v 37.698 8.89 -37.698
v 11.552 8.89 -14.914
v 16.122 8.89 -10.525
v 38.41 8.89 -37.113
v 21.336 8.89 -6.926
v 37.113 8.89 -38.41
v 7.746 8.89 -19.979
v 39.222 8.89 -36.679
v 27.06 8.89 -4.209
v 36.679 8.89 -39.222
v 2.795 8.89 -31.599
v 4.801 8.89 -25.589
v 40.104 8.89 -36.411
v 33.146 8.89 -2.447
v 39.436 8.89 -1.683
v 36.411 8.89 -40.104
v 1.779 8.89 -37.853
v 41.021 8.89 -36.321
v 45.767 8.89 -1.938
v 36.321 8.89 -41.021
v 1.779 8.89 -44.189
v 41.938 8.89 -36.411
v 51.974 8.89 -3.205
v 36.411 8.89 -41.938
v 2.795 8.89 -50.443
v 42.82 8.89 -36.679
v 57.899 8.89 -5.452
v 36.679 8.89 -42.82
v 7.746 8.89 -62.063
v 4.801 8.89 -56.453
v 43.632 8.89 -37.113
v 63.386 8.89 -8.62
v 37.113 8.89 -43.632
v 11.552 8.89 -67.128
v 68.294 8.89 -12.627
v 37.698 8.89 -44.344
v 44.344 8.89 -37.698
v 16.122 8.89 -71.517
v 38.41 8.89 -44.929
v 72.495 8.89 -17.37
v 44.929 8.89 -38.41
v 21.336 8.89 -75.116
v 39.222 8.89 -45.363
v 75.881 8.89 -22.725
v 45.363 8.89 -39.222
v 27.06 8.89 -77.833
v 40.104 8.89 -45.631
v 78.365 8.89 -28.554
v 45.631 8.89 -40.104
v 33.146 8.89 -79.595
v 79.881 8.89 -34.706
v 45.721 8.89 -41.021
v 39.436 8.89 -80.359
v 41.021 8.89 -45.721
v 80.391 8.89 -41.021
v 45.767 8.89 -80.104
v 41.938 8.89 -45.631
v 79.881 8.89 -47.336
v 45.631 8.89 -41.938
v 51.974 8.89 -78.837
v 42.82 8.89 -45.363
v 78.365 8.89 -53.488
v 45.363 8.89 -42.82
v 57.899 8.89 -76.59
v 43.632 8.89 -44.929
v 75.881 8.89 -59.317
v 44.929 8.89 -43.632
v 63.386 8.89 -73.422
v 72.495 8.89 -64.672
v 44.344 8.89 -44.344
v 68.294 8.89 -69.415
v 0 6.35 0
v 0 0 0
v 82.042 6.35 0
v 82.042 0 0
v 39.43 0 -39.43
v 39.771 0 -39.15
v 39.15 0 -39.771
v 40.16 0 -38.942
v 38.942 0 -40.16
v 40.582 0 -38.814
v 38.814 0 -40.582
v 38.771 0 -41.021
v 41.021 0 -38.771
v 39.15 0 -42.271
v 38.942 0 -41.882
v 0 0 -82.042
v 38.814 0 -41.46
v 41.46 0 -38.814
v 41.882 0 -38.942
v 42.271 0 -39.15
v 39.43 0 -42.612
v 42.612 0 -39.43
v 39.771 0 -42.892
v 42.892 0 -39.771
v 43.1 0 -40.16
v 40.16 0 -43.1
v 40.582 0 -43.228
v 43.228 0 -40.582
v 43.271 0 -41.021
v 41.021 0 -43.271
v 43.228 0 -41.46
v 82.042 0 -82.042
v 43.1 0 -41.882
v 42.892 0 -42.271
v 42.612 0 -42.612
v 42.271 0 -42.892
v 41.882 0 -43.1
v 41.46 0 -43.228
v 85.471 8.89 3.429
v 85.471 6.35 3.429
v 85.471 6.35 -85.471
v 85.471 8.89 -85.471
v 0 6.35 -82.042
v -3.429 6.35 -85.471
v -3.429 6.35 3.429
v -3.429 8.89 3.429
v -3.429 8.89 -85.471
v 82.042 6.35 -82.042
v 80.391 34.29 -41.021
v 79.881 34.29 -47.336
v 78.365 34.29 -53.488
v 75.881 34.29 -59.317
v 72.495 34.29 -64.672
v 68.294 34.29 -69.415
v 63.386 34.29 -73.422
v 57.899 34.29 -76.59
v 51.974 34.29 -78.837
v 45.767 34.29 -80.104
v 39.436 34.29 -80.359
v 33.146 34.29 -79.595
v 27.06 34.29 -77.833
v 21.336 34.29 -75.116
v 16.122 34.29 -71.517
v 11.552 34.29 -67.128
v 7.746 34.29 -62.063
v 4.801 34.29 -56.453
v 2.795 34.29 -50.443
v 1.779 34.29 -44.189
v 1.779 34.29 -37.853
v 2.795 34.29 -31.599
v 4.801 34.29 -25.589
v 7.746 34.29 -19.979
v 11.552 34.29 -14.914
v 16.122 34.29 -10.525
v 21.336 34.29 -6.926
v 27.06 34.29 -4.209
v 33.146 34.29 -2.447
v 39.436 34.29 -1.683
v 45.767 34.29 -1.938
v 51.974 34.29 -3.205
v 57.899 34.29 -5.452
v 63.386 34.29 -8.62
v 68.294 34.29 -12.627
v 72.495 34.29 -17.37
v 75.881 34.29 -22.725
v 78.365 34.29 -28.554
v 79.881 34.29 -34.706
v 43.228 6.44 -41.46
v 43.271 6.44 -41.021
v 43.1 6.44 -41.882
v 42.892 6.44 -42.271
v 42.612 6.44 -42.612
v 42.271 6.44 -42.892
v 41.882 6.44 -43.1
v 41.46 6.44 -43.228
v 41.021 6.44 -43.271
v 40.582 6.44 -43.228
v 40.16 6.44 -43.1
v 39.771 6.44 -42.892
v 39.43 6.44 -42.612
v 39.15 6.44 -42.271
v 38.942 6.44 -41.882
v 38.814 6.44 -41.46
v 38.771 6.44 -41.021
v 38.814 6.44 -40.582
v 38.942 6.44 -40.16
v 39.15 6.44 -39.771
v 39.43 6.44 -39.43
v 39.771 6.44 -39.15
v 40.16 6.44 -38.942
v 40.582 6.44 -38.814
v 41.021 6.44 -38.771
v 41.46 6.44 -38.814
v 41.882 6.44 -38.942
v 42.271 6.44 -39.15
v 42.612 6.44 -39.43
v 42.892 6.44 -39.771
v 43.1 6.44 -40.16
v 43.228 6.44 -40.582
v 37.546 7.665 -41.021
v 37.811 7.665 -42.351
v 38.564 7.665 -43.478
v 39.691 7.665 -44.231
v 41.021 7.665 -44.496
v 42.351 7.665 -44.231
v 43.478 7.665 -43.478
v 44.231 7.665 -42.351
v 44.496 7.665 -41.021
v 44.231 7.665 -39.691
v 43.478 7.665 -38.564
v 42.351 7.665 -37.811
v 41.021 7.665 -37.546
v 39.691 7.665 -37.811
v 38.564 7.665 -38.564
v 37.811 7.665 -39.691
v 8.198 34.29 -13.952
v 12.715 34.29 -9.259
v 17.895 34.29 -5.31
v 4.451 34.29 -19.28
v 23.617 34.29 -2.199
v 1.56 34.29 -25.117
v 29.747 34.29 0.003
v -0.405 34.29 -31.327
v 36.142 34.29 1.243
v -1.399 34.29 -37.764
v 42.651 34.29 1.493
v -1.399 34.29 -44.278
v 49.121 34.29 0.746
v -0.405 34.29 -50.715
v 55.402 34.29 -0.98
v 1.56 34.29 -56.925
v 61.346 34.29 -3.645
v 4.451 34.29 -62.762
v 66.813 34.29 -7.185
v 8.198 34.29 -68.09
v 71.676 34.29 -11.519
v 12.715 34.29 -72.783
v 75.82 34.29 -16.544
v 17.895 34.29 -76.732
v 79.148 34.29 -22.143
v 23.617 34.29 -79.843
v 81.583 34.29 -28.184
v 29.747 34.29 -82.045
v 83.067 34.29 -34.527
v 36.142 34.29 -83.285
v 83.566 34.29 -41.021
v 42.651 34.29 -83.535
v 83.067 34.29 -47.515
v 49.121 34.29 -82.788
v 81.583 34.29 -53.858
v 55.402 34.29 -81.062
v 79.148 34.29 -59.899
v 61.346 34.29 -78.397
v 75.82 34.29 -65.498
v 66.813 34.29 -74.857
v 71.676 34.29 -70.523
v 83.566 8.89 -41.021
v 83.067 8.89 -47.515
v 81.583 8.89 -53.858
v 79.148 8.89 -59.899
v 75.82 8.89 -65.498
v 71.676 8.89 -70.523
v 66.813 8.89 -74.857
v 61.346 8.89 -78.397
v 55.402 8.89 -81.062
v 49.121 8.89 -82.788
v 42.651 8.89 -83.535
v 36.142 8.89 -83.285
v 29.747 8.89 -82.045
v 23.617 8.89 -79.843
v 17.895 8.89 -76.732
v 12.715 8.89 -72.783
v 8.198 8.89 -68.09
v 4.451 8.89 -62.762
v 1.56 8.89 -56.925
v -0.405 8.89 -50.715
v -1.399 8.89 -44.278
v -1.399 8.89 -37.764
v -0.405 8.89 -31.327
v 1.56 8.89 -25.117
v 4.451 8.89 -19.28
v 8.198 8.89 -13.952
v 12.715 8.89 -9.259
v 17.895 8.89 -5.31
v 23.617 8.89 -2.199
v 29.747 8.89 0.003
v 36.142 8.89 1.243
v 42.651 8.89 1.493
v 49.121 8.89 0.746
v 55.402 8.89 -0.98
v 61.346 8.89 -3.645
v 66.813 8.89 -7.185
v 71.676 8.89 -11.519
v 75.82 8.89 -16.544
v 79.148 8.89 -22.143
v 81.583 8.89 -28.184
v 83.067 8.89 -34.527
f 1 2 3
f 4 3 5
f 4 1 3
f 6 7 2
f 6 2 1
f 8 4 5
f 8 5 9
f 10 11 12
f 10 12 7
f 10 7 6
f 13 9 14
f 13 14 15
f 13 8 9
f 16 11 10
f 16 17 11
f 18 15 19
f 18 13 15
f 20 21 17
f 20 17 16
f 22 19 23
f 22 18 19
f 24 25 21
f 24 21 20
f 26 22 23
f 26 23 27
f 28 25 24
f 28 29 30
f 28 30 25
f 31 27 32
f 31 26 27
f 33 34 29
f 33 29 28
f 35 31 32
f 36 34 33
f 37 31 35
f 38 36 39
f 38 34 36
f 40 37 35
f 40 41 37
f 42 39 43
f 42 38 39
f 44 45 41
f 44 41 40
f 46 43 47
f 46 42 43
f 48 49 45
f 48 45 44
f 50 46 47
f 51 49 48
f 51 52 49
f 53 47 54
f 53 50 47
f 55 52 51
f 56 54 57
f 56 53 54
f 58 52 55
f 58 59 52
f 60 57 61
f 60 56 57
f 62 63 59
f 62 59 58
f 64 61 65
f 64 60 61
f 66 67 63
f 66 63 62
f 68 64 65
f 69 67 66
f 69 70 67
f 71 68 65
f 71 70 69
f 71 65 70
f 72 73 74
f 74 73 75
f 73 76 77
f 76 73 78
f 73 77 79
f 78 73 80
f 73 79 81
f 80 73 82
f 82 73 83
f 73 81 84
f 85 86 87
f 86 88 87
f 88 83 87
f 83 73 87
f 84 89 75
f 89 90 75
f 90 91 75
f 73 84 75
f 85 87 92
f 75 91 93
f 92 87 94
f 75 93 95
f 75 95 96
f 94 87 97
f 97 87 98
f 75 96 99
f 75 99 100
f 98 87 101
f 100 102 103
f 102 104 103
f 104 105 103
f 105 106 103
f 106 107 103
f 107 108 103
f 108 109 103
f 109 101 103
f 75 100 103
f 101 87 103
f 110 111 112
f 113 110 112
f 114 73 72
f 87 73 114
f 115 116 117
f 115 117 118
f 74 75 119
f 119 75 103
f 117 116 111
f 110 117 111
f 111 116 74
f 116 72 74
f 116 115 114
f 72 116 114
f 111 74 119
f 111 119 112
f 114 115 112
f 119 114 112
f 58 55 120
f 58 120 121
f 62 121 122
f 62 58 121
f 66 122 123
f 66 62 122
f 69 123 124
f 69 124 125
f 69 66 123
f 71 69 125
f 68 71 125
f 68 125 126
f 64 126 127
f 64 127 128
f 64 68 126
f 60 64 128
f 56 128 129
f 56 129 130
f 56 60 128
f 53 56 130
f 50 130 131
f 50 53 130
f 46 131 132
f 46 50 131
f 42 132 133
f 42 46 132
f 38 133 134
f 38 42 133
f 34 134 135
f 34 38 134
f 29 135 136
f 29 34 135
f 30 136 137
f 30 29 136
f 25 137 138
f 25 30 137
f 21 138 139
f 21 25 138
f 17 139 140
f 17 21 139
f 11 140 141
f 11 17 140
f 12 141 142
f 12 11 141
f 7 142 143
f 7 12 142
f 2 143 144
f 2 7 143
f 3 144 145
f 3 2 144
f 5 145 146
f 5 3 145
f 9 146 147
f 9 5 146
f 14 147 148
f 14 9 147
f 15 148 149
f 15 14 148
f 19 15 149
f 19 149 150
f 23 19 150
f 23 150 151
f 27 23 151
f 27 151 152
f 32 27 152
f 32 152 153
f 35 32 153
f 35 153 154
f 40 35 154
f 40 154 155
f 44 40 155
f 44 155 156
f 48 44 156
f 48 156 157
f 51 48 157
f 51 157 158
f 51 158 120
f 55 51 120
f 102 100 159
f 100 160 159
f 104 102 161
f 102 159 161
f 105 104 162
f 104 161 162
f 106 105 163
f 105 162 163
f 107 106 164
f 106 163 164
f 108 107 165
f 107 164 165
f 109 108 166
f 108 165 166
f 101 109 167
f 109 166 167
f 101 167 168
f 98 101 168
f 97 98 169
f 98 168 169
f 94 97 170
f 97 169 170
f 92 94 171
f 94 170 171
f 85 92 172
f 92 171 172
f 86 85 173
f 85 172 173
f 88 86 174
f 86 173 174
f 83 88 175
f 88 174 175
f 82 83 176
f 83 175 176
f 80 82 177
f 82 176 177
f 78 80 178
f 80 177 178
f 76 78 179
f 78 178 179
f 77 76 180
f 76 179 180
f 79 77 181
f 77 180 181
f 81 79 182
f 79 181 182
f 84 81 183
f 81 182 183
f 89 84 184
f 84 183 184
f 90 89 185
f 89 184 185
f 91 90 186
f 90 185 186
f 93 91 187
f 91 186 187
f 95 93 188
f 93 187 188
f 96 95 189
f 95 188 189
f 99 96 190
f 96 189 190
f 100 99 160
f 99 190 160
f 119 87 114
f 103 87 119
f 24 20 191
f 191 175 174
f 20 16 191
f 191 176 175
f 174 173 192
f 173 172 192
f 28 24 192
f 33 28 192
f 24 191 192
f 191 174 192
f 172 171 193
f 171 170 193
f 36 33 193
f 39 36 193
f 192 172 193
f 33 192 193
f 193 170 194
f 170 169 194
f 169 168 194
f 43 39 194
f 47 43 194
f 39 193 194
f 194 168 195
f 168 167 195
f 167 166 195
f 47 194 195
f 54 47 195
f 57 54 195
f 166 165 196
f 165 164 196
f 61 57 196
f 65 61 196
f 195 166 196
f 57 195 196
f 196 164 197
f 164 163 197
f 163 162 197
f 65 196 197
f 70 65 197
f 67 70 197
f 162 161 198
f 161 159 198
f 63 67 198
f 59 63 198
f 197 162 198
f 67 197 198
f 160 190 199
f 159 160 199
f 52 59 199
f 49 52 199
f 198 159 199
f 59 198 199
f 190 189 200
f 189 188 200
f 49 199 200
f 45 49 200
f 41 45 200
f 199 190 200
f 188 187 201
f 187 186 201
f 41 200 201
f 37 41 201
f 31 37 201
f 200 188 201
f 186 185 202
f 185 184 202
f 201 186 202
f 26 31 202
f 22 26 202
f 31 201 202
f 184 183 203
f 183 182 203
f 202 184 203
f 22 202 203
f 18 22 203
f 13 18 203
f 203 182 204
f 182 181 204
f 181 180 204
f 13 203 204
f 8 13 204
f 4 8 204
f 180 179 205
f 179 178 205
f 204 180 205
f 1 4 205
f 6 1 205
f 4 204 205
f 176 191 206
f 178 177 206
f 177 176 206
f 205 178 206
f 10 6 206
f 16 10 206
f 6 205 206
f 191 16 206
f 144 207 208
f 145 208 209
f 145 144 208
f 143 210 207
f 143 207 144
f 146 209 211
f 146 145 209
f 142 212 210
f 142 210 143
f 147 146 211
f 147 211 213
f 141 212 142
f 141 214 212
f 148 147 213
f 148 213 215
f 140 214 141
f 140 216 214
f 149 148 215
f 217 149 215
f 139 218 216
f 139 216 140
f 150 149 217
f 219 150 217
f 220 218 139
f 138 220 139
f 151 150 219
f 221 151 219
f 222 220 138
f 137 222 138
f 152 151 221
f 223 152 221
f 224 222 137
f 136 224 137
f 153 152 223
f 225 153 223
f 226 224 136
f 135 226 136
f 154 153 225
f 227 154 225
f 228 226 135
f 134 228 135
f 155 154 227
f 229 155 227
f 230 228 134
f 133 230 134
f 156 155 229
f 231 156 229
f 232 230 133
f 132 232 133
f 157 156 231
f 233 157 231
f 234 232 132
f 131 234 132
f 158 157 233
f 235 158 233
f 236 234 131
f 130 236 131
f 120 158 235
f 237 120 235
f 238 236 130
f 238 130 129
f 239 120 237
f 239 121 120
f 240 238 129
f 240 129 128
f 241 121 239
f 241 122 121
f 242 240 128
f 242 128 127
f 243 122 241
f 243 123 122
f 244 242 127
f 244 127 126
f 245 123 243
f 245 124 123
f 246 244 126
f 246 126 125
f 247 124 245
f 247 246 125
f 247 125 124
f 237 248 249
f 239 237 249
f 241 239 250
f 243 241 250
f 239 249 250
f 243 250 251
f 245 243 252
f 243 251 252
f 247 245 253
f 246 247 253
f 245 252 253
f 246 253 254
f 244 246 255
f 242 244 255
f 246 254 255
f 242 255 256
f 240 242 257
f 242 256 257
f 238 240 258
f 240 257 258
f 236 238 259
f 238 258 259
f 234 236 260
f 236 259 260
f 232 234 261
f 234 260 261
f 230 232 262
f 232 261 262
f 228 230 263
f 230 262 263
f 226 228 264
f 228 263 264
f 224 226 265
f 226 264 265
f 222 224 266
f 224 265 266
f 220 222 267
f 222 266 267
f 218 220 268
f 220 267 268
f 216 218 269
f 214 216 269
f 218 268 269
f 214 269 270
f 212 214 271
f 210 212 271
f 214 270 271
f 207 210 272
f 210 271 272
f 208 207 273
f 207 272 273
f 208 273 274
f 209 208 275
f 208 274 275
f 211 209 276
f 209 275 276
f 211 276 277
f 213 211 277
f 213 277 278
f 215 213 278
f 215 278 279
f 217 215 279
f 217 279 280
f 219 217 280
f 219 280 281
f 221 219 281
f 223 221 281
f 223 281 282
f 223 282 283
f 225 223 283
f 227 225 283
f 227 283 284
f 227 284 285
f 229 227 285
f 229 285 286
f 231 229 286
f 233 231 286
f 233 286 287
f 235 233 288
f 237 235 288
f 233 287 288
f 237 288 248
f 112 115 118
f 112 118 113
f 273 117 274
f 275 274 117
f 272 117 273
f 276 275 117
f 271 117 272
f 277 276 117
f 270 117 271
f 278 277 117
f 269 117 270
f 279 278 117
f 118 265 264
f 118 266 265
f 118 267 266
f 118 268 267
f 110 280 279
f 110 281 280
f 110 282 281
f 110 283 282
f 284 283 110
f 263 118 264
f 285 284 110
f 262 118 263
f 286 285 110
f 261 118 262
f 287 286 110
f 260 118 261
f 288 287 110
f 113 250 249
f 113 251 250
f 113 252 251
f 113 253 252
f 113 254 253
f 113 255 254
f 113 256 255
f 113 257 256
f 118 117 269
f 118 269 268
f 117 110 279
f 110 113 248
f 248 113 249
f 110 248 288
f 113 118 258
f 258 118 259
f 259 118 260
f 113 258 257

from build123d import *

# Parameters (mm, degrees)
SKETCH1_W                                       = 82.042
SKETCH1_H                                       = 82.042
BOSS_EXTRUDE1_DEPTH                             = 6.35
SKETCH3_W                                       = 88.9
SKETCH3_H                                       = 88.9
BOSS_EXTRUDE3_DEPTH                             = 2.54
SKETCH4_R                                       = 2.25
CUT_EXTRUDE1_DEPTH                              = 9.89
SKETCH5_R                                       = 42.545
SKETCH5_R_2                                     = 39.37
BOSS_EXTRUDE4_DEPTH                             = 25.4
CSK_FOR_M4_FLAT_HEAD_MACHINE_SCREW1_D           = 4.5
CSK_FOR_M4_FLAT_HEAD_MACHINE_SCREW1_DEPTH       = 3.99999
CSK_FOR_M4_FLAT_HEAD_MACHINE_SCREW1_CSINK_D     = 9.4
CSK_FOR_M4_FLAT_HEAD_MACHINE_SCREW1_CSINK_ANGLE = 90
CSK_FOR_M4_FLAT_HEAD_MACHINE_SCREW1_TIP         = 1.351936393


with BuildPart() as part:
    # Sketch1 → Boss-Extrude1 (new body)
    with BuildSketch(Plane(origin=(0, 0, 0), x_dir=(1, 0, 0), z_dir=(0, 1, 0))):
        with Locations((41.021, 41.021)):
            Rectangle(SKETCH1_W, SKETCH1_H)
    extrude(amount=BOSS_EXTRUDE1_DEPTH)

    # Sketch3 → Boss-Extrude3 (add)
    with BuildSketch(Plane(origin=(0, 6.35, 0), x_dir=(1, 0, 0), z_dir=(0, 1, 0))):
        with Locations((41.021, 41.021)):
            Rectangle(SKETCH3_W, SKETCH3_H)
    extrude(amount=BOSS_EXTRUDE3_DEPTH)

    # Sketch4 → Cut-Extrude1 (cut, through all)
    with BuildSketch(Plane(origin=(0, 8.89, 0), x_dir=(1, 0, 0), z_dir=(0, 1, 0))):
        with Locations((41.021, 41.021)):
            Circle(SKETCH4_R)
    extrude(amount=-CUT_EXTRUDE1_DEPTH, mode=Mode.SUBTRACT)

    # Sketch5 → Boss-Extrude4 (add)
    with BuildSketch(Plane(origin=(0, 8.89, 0), x_dir=(1, 0, 0), z_dir=(0, 1, 0))):
        with Locations((41.021, 41.021)):
            Circle(SKETCH5_R)
        with Locations((41.021, 41.021)):
            Circle(SKETCH5_R_2, mode=Mode.SUBTRACT)
    extrude(amount=BOSS_EXTRUDE4_DEPTH)

    # CSK for M4 Flat Head Machine Screw1
    with Locations(Plane(origin=(0, 8.89, 0), x_dir=(1, 0, 0), z_dir=(0, 1, 0))):
        with Locations((41.021, 41.021)):
            CounterSinkHole(CSK_FOR_M4_FLAT_HEAD_MACHINE_SCREW1_D / 2, CSK_FOR_M4_FLAT_HEAD_MACHINE_SCREW1_CSINK_D / 2, depth=CSK_FOR_M4_FLAT_HEAD_MACHINE_SCREW1_DEPTH, counter_sink_angle=CSK_FOR_M4_FLAT_HEAD_MACHINE_SCREW1_CSINK_ANGLE)
            with Locations((0, 0, -(CSK_FOR_M4_FLAT_HEAD_MACHINE_SCREW1_DEPTH + CSK_FOR_M4_FLAT_HEAD_MACHINE_SCREW1_TIP / 2))):  # 118° drill point
                Cone(0, CSK_FOR_M4_FLAT_HEAD_MACHINE_SCREW1_D / 2, CSK_FOR_M4_FLAT_HEAD_MACHINE_SCREW1_TIP, mode=Mode.SUBTRACT)


solid = part.part
